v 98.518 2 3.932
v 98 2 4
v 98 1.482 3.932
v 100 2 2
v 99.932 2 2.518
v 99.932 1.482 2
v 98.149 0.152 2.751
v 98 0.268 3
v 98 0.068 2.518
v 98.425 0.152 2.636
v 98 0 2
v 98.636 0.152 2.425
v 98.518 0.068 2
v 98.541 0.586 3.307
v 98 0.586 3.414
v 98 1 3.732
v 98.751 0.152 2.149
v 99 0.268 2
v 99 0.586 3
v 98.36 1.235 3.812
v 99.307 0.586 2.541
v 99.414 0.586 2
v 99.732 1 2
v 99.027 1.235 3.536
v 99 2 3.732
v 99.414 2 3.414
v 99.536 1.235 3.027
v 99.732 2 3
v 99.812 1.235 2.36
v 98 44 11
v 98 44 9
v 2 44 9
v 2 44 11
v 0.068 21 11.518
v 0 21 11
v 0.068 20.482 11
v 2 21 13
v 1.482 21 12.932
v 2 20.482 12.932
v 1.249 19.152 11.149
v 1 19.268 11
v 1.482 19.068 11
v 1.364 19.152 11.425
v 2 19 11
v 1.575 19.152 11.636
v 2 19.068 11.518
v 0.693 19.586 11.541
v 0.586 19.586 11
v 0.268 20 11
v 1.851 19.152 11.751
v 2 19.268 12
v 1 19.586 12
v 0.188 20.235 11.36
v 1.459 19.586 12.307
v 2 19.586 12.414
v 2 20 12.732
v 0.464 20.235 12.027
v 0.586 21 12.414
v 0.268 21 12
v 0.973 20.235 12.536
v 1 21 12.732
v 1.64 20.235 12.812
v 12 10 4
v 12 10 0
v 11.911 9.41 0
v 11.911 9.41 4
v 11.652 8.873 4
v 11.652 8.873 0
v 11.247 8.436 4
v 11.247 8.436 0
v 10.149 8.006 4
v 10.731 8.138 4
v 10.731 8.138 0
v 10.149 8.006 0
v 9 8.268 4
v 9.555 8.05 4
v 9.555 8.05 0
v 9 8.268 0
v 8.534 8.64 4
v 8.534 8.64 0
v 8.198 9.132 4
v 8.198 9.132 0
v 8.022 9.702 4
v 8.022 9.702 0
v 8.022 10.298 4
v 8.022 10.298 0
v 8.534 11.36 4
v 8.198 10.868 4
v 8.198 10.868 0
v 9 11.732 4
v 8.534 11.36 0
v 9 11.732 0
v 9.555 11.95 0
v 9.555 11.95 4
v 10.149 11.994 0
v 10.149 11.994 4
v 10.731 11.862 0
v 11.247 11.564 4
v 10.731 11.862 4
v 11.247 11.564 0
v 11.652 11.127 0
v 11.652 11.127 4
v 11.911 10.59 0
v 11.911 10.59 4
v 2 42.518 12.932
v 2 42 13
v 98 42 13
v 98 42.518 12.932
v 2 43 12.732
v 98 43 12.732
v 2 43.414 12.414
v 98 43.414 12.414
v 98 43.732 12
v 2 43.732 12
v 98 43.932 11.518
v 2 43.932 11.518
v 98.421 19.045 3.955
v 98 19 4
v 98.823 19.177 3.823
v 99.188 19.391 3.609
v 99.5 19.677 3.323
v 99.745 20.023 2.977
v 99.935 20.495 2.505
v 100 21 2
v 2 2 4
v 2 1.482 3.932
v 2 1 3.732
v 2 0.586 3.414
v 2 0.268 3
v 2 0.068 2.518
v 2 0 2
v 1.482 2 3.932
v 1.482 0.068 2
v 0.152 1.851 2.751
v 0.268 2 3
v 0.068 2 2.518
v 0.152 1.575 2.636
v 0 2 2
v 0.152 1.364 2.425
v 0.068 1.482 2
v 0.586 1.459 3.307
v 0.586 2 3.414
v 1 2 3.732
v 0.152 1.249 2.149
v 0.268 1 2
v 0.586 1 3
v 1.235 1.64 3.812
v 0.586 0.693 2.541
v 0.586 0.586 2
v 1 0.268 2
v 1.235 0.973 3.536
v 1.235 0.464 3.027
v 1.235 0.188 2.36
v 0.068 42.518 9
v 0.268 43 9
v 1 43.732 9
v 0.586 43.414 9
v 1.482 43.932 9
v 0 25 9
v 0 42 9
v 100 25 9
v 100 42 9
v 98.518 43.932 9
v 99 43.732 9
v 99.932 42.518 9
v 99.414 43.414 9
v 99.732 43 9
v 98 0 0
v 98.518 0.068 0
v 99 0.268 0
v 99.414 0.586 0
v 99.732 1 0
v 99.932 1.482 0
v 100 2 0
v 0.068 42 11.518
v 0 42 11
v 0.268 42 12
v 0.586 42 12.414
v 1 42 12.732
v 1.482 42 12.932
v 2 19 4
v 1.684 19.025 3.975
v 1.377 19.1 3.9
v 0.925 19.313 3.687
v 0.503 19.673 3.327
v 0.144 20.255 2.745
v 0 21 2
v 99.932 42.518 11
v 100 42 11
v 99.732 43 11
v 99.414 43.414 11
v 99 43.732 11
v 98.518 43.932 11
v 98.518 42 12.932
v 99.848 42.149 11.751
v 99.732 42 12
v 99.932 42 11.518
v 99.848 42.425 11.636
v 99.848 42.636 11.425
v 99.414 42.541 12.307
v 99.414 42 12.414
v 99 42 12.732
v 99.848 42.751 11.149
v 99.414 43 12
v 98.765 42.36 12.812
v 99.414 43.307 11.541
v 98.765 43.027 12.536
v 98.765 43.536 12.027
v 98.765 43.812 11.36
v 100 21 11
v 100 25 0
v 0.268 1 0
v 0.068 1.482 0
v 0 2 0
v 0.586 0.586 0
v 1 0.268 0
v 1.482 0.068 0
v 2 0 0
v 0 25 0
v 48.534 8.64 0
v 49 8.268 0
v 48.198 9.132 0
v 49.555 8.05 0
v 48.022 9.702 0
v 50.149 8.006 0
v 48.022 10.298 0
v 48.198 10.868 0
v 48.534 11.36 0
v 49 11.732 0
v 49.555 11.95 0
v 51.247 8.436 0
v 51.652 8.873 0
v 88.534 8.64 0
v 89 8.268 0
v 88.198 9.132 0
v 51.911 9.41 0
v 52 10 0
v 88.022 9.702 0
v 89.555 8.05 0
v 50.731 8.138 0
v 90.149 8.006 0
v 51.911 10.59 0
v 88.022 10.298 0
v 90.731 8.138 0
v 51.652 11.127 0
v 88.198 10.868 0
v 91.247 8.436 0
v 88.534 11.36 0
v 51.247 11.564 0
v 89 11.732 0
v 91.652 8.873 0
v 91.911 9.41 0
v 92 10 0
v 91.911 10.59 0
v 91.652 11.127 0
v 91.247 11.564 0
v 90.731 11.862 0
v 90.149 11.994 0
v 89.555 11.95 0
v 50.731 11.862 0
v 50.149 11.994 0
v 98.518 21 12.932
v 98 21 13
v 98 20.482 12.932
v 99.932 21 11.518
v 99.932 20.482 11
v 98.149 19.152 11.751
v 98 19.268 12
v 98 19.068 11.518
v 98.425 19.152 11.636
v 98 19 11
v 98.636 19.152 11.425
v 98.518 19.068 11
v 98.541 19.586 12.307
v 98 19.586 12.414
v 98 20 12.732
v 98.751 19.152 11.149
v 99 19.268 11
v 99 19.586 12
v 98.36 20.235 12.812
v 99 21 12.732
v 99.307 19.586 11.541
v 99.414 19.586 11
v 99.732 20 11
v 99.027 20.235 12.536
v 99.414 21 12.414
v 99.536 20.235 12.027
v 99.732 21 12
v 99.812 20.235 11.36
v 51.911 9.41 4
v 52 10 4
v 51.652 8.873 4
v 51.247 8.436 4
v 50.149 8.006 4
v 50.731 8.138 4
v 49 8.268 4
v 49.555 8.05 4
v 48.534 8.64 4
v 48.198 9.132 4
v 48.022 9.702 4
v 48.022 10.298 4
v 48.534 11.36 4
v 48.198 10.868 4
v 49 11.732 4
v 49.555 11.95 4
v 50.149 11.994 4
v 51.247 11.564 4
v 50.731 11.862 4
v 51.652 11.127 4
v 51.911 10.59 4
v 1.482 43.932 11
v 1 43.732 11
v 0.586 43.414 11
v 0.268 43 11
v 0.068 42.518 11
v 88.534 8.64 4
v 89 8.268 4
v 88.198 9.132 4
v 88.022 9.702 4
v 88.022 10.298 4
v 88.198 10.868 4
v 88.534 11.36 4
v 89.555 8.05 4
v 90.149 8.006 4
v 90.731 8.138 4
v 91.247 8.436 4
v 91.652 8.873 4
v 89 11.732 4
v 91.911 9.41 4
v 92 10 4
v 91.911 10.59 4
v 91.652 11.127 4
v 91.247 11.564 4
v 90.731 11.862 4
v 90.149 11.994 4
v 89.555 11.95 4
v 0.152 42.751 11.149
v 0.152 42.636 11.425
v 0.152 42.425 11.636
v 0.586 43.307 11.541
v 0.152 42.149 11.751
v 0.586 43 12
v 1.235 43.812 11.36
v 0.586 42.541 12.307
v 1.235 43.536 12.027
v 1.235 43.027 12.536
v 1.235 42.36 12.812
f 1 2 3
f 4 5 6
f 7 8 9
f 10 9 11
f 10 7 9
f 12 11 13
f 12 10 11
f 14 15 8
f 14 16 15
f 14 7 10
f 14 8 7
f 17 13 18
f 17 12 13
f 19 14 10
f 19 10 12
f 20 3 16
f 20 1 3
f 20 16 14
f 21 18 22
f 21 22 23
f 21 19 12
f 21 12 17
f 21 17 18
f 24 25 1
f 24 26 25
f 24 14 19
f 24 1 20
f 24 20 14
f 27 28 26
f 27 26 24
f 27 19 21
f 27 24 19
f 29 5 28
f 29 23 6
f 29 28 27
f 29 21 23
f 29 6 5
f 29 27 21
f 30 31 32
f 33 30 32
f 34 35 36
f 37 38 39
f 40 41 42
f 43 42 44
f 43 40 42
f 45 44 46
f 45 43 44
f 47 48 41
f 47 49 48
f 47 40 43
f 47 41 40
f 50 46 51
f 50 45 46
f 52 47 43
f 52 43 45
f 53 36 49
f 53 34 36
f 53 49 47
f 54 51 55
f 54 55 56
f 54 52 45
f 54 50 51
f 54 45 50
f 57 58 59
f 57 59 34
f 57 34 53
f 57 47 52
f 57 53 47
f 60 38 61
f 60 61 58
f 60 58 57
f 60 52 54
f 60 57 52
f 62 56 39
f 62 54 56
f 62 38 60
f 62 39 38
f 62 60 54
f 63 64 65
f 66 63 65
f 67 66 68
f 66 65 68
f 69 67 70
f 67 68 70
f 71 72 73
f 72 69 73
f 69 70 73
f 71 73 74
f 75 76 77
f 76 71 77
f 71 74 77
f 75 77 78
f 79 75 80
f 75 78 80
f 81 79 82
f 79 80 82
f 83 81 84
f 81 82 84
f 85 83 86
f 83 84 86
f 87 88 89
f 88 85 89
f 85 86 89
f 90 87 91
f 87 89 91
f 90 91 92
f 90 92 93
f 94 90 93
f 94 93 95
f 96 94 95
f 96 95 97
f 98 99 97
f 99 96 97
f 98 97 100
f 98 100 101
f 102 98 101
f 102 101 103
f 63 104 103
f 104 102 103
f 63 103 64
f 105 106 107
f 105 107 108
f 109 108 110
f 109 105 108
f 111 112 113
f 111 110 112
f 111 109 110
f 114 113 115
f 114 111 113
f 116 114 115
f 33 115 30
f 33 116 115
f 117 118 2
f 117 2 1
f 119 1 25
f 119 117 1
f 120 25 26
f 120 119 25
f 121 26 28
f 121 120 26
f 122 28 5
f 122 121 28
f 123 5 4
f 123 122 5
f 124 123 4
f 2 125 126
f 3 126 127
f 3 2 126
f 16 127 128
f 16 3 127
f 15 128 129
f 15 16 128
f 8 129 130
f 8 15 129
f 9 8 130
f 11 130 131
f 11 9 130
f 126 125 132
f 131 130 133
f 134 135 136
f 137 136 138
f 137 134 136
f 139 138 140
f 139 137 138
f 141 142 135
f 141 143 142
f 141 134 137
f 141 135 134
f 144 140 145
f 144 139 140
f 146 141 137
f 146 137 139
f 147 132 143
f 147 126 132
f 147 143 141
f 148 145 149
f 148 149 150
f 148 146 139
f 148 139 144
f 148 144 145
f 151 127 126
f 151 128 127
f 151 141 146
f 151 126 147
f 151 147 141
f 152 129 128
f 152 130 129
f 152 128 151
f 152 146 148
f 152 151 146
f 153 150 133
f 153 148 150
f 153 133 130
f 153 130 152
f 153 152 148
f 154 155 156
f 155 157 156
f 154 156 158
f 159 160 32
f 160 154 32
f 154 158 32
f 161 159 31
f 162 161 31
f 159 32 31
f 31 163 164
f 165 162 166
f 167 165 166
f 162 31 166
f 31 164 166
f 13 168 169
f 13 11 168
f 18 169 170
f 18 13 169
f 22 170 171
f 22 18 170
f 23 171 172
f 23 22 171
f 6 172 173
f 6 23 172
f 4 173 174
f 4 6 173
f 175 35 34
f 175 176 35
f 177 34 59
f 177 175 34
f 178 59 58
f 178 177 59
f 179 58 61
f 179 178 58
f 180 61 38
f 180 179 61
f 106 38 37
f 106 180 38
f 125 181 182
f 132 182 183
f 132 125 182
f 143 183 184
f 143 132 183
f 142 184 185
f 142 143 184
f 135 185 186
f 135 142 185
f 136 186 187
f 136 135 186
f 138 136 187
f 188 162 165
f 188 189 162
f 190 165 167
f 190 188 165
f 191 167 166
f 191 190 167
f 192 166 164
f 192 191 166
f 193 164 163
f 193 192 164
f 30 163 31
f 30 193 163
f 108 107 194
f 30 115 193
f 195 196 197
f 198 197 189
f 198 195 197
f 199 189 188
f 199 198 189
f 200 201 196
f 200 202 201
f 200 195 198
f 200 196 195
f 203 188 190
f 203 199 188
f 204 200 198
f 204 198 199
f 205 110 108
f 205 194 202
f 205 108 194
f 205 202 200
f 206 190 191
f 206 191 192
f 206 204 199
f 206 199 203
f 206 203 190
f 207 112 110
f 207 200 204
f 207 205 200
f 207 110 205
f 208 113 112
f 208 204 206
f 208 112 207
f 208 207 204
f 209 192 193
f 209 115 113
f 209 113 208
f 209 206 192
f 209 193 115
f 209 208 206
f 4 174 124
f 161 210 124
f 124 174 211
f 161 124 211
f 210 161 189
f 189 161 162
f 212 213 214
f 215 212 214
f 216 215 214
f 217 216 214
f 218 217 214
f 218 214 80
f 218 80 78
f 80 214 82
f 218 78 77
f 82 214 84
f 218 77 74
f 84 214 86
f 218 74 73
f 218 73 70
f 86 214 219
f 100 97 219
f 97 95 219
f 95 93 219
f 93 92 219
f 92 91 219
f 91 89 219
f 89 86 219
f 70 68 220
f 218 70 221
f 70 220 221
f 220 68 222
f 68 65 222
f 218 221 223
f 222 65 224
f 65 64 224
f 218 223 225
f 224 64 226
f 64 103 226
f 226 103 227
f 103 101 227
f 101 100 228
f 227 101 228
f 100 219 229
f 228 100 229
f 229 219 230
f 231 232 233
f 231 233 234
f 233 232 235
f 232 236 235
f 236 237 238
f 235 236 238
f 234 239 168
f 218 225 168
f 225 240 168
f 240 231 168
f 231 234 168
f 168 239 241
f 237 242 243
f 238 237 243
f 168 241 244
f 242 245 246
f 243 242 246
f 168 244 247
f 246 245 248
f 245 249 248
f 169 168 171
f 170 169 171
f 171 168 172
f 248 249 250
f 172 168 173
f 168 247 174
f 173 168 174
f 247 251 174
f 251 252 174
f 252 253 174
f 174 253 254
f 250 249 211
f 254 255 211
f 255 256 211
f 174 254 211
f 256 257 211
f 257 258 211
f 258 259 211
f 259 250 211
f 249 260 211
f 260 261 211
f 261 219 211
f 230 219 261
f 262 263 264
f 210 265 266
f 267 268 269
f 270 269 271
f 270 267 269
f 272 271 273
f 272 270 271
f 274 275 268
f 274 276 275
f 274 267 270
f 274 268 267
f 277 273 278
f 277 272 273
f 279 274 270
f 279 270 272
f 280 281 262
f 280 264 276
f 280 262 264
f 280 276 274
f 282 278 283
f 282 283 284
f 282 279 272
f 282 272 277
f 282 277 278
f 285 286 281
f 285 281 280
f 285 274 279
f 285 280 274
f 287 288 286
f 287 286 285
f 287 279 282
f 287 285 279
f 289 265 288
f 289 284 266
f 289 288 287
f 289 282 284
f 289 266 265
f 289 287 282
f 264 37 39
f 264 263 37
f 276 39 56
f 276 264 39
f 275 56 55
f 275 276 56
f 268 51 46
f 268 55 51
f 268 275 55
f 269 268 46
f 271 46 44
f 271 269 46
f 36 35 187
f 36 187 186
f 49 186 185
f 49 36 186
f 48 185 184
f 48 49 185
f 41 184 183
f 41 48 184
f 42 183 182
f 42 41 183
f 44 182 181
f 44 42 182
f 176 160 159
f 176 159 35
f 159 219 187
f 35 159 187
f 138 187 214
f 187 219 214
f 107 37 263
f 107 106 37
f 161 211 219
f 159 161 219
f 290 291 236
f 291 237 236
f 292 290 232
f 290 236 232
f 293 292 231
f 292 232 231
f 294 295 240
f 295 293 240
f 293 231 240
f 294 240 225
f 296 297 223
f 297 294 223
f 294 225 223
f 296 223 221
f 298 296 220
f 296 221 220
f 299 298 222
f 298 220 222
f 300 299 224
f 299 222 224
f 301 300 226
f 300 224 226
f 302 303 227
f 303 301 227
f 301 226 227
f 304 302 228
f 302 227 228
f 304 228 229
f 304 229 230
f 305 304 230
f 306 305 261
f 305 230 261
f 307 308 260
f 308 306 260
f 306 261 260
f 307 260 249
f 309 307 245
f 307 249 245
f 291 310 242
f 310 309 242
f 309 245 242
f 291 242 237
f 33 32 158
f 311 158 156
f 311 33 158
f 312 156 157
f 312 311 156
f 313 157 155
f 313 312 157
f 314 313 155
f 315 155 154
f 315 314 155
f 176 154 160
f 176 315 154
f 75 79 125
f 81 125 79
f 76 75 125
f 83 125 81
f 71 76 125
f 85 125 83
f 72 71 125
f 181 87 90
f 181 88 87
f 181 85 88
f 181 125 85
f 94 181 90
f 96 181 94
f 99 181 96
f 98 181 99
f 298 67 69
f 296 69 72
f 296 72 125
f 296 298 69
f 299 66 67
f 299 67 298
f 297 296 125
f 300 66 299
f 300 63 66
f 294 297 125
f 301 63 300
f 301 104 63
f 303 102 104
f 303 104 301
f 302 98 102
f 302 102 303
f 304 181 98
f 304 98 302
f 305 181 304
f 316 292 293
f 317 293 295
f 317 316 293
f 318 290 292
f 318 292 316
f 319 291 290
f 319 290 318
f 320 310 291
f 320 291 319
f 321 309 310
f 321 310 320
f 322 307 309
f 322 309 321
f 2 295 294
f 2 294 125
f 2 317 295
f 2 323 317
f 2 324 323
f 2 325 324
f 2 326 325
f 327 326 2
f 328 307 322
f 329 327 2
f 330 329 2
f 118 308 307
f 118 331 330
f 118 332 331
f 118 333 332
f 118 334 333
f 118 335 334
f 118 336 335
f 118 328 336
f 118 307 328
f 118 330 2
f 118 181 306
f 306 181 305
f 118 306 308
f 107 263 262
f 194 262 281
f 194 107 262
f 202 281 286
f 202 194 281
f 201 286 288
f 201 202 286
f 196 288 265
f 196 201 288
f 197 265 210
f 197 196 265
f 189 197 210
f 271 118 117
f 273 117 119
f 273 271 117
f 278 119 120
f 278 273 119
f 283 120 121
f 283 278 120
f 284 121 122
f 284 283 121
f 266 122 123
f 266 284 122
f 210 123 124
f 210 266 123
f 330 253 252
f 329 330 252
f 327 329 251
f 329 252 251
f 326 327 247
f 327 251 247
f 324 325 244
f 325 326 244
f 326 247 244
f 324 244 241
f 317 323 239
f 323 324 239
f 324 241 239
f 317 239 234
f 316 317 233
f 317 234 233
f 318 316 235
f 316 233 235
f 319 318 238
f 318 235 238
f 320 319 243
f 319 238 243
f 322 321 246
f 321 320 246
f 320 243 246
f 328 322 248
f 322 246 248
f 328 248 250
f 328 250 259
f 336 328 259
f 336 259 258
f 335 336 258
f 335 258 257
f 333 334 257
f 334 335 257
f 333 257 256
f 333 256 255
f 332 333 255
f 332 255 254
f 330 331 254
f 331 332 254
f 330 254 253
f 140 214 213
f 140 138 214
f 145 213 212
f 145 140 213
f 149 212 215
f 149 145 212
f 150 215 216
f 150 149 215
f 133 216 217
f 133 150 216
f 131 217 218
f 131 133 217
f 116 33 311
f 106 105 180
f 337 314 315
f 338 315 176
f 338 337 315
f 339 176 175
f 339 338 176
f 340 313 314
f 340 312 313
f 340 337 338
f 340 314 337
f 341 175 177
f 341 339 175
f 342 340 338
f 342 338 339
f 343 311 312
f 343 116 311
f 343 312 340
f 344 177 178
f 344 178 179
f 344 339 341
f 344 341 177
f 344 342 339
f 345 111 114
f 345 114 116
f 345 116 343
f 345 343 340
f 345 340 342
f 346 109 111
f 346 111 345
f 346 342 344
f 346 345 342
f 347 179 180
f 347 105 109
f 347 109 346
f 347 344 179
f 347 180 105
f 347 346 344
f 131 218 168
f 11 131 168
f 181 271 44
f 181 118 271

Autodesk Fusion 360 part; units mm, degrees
sketch "Sketch1" plane through (0, 0, 0) normal (0, 0, 1) x (1, 0, 0)
  line L0 (0, 0) -> (100, 0)
  line L1 (100, 0) -> (100, 25)
  line L2 (100, 25) -> (0, 25)
  line L3 (0, 25) -> (0, 0)
  line L4 (0, 25) -> (100, 25)
  line L5 (100, 25) -> (100, 19)
  line L6 (100, 19) -> (0, 19)
  line L7 (0, 19) -> (0, 25)
  circle A0 centre (50, 10) radius 2
  circle A1 centre (10, 10) radius 2
  circle A2 centre (90, 10) radius 2
  dimension "d1" = 100
  dimension "d2" = 6
  dimension "d12" = 4
  dimension "d13" = 4
  dimension "d14" = 4
extrude "Extrude1" add sketch "Sketch1" along normal blind 4 contours L0 L1 L3 L6
extrude "Extrude2" add sketch "Sketch1" along normal blind 9 contours L1 L2 L3 L4 L5 L6 L7
sketch "Sketch2" plane through (0, 0, 9) normal (0, 0, 1) x (1, 0, 0)
  line L0 (0, 19) -> (100, 19)
  line L1 (100, 19) -> (100, 25)
  line L2 (100, 25) -> (0, 25)
  line L3 (0, 25) -> (0, 19)
  line L4 (0, 19) -> (100, 19)
  line L5 (100, 19) -> (100, 44)
  line L6 (100, 44) -> (0, 44)
  line L7 (0, 44) -> (0, 19)
  dimension "d7" = 25
  dimension "d8" = 100
extrude "Extrude3" add sketch "Sketch2" along normal blind 4
fillet "Fillet1" radius 2 13 edges at (50, 44, 13) (0, 31.5, 13) (100, 44, 11) (100, 31.5, 13) (50, 19, 13) (100, 19, 8.5) (100, 9.5, 4) (50, 0, 4) (0, 9.5, 4) (100, 0, 2) (0, 0, 2) (0, 19, 8.5) (0, 44, 11)
